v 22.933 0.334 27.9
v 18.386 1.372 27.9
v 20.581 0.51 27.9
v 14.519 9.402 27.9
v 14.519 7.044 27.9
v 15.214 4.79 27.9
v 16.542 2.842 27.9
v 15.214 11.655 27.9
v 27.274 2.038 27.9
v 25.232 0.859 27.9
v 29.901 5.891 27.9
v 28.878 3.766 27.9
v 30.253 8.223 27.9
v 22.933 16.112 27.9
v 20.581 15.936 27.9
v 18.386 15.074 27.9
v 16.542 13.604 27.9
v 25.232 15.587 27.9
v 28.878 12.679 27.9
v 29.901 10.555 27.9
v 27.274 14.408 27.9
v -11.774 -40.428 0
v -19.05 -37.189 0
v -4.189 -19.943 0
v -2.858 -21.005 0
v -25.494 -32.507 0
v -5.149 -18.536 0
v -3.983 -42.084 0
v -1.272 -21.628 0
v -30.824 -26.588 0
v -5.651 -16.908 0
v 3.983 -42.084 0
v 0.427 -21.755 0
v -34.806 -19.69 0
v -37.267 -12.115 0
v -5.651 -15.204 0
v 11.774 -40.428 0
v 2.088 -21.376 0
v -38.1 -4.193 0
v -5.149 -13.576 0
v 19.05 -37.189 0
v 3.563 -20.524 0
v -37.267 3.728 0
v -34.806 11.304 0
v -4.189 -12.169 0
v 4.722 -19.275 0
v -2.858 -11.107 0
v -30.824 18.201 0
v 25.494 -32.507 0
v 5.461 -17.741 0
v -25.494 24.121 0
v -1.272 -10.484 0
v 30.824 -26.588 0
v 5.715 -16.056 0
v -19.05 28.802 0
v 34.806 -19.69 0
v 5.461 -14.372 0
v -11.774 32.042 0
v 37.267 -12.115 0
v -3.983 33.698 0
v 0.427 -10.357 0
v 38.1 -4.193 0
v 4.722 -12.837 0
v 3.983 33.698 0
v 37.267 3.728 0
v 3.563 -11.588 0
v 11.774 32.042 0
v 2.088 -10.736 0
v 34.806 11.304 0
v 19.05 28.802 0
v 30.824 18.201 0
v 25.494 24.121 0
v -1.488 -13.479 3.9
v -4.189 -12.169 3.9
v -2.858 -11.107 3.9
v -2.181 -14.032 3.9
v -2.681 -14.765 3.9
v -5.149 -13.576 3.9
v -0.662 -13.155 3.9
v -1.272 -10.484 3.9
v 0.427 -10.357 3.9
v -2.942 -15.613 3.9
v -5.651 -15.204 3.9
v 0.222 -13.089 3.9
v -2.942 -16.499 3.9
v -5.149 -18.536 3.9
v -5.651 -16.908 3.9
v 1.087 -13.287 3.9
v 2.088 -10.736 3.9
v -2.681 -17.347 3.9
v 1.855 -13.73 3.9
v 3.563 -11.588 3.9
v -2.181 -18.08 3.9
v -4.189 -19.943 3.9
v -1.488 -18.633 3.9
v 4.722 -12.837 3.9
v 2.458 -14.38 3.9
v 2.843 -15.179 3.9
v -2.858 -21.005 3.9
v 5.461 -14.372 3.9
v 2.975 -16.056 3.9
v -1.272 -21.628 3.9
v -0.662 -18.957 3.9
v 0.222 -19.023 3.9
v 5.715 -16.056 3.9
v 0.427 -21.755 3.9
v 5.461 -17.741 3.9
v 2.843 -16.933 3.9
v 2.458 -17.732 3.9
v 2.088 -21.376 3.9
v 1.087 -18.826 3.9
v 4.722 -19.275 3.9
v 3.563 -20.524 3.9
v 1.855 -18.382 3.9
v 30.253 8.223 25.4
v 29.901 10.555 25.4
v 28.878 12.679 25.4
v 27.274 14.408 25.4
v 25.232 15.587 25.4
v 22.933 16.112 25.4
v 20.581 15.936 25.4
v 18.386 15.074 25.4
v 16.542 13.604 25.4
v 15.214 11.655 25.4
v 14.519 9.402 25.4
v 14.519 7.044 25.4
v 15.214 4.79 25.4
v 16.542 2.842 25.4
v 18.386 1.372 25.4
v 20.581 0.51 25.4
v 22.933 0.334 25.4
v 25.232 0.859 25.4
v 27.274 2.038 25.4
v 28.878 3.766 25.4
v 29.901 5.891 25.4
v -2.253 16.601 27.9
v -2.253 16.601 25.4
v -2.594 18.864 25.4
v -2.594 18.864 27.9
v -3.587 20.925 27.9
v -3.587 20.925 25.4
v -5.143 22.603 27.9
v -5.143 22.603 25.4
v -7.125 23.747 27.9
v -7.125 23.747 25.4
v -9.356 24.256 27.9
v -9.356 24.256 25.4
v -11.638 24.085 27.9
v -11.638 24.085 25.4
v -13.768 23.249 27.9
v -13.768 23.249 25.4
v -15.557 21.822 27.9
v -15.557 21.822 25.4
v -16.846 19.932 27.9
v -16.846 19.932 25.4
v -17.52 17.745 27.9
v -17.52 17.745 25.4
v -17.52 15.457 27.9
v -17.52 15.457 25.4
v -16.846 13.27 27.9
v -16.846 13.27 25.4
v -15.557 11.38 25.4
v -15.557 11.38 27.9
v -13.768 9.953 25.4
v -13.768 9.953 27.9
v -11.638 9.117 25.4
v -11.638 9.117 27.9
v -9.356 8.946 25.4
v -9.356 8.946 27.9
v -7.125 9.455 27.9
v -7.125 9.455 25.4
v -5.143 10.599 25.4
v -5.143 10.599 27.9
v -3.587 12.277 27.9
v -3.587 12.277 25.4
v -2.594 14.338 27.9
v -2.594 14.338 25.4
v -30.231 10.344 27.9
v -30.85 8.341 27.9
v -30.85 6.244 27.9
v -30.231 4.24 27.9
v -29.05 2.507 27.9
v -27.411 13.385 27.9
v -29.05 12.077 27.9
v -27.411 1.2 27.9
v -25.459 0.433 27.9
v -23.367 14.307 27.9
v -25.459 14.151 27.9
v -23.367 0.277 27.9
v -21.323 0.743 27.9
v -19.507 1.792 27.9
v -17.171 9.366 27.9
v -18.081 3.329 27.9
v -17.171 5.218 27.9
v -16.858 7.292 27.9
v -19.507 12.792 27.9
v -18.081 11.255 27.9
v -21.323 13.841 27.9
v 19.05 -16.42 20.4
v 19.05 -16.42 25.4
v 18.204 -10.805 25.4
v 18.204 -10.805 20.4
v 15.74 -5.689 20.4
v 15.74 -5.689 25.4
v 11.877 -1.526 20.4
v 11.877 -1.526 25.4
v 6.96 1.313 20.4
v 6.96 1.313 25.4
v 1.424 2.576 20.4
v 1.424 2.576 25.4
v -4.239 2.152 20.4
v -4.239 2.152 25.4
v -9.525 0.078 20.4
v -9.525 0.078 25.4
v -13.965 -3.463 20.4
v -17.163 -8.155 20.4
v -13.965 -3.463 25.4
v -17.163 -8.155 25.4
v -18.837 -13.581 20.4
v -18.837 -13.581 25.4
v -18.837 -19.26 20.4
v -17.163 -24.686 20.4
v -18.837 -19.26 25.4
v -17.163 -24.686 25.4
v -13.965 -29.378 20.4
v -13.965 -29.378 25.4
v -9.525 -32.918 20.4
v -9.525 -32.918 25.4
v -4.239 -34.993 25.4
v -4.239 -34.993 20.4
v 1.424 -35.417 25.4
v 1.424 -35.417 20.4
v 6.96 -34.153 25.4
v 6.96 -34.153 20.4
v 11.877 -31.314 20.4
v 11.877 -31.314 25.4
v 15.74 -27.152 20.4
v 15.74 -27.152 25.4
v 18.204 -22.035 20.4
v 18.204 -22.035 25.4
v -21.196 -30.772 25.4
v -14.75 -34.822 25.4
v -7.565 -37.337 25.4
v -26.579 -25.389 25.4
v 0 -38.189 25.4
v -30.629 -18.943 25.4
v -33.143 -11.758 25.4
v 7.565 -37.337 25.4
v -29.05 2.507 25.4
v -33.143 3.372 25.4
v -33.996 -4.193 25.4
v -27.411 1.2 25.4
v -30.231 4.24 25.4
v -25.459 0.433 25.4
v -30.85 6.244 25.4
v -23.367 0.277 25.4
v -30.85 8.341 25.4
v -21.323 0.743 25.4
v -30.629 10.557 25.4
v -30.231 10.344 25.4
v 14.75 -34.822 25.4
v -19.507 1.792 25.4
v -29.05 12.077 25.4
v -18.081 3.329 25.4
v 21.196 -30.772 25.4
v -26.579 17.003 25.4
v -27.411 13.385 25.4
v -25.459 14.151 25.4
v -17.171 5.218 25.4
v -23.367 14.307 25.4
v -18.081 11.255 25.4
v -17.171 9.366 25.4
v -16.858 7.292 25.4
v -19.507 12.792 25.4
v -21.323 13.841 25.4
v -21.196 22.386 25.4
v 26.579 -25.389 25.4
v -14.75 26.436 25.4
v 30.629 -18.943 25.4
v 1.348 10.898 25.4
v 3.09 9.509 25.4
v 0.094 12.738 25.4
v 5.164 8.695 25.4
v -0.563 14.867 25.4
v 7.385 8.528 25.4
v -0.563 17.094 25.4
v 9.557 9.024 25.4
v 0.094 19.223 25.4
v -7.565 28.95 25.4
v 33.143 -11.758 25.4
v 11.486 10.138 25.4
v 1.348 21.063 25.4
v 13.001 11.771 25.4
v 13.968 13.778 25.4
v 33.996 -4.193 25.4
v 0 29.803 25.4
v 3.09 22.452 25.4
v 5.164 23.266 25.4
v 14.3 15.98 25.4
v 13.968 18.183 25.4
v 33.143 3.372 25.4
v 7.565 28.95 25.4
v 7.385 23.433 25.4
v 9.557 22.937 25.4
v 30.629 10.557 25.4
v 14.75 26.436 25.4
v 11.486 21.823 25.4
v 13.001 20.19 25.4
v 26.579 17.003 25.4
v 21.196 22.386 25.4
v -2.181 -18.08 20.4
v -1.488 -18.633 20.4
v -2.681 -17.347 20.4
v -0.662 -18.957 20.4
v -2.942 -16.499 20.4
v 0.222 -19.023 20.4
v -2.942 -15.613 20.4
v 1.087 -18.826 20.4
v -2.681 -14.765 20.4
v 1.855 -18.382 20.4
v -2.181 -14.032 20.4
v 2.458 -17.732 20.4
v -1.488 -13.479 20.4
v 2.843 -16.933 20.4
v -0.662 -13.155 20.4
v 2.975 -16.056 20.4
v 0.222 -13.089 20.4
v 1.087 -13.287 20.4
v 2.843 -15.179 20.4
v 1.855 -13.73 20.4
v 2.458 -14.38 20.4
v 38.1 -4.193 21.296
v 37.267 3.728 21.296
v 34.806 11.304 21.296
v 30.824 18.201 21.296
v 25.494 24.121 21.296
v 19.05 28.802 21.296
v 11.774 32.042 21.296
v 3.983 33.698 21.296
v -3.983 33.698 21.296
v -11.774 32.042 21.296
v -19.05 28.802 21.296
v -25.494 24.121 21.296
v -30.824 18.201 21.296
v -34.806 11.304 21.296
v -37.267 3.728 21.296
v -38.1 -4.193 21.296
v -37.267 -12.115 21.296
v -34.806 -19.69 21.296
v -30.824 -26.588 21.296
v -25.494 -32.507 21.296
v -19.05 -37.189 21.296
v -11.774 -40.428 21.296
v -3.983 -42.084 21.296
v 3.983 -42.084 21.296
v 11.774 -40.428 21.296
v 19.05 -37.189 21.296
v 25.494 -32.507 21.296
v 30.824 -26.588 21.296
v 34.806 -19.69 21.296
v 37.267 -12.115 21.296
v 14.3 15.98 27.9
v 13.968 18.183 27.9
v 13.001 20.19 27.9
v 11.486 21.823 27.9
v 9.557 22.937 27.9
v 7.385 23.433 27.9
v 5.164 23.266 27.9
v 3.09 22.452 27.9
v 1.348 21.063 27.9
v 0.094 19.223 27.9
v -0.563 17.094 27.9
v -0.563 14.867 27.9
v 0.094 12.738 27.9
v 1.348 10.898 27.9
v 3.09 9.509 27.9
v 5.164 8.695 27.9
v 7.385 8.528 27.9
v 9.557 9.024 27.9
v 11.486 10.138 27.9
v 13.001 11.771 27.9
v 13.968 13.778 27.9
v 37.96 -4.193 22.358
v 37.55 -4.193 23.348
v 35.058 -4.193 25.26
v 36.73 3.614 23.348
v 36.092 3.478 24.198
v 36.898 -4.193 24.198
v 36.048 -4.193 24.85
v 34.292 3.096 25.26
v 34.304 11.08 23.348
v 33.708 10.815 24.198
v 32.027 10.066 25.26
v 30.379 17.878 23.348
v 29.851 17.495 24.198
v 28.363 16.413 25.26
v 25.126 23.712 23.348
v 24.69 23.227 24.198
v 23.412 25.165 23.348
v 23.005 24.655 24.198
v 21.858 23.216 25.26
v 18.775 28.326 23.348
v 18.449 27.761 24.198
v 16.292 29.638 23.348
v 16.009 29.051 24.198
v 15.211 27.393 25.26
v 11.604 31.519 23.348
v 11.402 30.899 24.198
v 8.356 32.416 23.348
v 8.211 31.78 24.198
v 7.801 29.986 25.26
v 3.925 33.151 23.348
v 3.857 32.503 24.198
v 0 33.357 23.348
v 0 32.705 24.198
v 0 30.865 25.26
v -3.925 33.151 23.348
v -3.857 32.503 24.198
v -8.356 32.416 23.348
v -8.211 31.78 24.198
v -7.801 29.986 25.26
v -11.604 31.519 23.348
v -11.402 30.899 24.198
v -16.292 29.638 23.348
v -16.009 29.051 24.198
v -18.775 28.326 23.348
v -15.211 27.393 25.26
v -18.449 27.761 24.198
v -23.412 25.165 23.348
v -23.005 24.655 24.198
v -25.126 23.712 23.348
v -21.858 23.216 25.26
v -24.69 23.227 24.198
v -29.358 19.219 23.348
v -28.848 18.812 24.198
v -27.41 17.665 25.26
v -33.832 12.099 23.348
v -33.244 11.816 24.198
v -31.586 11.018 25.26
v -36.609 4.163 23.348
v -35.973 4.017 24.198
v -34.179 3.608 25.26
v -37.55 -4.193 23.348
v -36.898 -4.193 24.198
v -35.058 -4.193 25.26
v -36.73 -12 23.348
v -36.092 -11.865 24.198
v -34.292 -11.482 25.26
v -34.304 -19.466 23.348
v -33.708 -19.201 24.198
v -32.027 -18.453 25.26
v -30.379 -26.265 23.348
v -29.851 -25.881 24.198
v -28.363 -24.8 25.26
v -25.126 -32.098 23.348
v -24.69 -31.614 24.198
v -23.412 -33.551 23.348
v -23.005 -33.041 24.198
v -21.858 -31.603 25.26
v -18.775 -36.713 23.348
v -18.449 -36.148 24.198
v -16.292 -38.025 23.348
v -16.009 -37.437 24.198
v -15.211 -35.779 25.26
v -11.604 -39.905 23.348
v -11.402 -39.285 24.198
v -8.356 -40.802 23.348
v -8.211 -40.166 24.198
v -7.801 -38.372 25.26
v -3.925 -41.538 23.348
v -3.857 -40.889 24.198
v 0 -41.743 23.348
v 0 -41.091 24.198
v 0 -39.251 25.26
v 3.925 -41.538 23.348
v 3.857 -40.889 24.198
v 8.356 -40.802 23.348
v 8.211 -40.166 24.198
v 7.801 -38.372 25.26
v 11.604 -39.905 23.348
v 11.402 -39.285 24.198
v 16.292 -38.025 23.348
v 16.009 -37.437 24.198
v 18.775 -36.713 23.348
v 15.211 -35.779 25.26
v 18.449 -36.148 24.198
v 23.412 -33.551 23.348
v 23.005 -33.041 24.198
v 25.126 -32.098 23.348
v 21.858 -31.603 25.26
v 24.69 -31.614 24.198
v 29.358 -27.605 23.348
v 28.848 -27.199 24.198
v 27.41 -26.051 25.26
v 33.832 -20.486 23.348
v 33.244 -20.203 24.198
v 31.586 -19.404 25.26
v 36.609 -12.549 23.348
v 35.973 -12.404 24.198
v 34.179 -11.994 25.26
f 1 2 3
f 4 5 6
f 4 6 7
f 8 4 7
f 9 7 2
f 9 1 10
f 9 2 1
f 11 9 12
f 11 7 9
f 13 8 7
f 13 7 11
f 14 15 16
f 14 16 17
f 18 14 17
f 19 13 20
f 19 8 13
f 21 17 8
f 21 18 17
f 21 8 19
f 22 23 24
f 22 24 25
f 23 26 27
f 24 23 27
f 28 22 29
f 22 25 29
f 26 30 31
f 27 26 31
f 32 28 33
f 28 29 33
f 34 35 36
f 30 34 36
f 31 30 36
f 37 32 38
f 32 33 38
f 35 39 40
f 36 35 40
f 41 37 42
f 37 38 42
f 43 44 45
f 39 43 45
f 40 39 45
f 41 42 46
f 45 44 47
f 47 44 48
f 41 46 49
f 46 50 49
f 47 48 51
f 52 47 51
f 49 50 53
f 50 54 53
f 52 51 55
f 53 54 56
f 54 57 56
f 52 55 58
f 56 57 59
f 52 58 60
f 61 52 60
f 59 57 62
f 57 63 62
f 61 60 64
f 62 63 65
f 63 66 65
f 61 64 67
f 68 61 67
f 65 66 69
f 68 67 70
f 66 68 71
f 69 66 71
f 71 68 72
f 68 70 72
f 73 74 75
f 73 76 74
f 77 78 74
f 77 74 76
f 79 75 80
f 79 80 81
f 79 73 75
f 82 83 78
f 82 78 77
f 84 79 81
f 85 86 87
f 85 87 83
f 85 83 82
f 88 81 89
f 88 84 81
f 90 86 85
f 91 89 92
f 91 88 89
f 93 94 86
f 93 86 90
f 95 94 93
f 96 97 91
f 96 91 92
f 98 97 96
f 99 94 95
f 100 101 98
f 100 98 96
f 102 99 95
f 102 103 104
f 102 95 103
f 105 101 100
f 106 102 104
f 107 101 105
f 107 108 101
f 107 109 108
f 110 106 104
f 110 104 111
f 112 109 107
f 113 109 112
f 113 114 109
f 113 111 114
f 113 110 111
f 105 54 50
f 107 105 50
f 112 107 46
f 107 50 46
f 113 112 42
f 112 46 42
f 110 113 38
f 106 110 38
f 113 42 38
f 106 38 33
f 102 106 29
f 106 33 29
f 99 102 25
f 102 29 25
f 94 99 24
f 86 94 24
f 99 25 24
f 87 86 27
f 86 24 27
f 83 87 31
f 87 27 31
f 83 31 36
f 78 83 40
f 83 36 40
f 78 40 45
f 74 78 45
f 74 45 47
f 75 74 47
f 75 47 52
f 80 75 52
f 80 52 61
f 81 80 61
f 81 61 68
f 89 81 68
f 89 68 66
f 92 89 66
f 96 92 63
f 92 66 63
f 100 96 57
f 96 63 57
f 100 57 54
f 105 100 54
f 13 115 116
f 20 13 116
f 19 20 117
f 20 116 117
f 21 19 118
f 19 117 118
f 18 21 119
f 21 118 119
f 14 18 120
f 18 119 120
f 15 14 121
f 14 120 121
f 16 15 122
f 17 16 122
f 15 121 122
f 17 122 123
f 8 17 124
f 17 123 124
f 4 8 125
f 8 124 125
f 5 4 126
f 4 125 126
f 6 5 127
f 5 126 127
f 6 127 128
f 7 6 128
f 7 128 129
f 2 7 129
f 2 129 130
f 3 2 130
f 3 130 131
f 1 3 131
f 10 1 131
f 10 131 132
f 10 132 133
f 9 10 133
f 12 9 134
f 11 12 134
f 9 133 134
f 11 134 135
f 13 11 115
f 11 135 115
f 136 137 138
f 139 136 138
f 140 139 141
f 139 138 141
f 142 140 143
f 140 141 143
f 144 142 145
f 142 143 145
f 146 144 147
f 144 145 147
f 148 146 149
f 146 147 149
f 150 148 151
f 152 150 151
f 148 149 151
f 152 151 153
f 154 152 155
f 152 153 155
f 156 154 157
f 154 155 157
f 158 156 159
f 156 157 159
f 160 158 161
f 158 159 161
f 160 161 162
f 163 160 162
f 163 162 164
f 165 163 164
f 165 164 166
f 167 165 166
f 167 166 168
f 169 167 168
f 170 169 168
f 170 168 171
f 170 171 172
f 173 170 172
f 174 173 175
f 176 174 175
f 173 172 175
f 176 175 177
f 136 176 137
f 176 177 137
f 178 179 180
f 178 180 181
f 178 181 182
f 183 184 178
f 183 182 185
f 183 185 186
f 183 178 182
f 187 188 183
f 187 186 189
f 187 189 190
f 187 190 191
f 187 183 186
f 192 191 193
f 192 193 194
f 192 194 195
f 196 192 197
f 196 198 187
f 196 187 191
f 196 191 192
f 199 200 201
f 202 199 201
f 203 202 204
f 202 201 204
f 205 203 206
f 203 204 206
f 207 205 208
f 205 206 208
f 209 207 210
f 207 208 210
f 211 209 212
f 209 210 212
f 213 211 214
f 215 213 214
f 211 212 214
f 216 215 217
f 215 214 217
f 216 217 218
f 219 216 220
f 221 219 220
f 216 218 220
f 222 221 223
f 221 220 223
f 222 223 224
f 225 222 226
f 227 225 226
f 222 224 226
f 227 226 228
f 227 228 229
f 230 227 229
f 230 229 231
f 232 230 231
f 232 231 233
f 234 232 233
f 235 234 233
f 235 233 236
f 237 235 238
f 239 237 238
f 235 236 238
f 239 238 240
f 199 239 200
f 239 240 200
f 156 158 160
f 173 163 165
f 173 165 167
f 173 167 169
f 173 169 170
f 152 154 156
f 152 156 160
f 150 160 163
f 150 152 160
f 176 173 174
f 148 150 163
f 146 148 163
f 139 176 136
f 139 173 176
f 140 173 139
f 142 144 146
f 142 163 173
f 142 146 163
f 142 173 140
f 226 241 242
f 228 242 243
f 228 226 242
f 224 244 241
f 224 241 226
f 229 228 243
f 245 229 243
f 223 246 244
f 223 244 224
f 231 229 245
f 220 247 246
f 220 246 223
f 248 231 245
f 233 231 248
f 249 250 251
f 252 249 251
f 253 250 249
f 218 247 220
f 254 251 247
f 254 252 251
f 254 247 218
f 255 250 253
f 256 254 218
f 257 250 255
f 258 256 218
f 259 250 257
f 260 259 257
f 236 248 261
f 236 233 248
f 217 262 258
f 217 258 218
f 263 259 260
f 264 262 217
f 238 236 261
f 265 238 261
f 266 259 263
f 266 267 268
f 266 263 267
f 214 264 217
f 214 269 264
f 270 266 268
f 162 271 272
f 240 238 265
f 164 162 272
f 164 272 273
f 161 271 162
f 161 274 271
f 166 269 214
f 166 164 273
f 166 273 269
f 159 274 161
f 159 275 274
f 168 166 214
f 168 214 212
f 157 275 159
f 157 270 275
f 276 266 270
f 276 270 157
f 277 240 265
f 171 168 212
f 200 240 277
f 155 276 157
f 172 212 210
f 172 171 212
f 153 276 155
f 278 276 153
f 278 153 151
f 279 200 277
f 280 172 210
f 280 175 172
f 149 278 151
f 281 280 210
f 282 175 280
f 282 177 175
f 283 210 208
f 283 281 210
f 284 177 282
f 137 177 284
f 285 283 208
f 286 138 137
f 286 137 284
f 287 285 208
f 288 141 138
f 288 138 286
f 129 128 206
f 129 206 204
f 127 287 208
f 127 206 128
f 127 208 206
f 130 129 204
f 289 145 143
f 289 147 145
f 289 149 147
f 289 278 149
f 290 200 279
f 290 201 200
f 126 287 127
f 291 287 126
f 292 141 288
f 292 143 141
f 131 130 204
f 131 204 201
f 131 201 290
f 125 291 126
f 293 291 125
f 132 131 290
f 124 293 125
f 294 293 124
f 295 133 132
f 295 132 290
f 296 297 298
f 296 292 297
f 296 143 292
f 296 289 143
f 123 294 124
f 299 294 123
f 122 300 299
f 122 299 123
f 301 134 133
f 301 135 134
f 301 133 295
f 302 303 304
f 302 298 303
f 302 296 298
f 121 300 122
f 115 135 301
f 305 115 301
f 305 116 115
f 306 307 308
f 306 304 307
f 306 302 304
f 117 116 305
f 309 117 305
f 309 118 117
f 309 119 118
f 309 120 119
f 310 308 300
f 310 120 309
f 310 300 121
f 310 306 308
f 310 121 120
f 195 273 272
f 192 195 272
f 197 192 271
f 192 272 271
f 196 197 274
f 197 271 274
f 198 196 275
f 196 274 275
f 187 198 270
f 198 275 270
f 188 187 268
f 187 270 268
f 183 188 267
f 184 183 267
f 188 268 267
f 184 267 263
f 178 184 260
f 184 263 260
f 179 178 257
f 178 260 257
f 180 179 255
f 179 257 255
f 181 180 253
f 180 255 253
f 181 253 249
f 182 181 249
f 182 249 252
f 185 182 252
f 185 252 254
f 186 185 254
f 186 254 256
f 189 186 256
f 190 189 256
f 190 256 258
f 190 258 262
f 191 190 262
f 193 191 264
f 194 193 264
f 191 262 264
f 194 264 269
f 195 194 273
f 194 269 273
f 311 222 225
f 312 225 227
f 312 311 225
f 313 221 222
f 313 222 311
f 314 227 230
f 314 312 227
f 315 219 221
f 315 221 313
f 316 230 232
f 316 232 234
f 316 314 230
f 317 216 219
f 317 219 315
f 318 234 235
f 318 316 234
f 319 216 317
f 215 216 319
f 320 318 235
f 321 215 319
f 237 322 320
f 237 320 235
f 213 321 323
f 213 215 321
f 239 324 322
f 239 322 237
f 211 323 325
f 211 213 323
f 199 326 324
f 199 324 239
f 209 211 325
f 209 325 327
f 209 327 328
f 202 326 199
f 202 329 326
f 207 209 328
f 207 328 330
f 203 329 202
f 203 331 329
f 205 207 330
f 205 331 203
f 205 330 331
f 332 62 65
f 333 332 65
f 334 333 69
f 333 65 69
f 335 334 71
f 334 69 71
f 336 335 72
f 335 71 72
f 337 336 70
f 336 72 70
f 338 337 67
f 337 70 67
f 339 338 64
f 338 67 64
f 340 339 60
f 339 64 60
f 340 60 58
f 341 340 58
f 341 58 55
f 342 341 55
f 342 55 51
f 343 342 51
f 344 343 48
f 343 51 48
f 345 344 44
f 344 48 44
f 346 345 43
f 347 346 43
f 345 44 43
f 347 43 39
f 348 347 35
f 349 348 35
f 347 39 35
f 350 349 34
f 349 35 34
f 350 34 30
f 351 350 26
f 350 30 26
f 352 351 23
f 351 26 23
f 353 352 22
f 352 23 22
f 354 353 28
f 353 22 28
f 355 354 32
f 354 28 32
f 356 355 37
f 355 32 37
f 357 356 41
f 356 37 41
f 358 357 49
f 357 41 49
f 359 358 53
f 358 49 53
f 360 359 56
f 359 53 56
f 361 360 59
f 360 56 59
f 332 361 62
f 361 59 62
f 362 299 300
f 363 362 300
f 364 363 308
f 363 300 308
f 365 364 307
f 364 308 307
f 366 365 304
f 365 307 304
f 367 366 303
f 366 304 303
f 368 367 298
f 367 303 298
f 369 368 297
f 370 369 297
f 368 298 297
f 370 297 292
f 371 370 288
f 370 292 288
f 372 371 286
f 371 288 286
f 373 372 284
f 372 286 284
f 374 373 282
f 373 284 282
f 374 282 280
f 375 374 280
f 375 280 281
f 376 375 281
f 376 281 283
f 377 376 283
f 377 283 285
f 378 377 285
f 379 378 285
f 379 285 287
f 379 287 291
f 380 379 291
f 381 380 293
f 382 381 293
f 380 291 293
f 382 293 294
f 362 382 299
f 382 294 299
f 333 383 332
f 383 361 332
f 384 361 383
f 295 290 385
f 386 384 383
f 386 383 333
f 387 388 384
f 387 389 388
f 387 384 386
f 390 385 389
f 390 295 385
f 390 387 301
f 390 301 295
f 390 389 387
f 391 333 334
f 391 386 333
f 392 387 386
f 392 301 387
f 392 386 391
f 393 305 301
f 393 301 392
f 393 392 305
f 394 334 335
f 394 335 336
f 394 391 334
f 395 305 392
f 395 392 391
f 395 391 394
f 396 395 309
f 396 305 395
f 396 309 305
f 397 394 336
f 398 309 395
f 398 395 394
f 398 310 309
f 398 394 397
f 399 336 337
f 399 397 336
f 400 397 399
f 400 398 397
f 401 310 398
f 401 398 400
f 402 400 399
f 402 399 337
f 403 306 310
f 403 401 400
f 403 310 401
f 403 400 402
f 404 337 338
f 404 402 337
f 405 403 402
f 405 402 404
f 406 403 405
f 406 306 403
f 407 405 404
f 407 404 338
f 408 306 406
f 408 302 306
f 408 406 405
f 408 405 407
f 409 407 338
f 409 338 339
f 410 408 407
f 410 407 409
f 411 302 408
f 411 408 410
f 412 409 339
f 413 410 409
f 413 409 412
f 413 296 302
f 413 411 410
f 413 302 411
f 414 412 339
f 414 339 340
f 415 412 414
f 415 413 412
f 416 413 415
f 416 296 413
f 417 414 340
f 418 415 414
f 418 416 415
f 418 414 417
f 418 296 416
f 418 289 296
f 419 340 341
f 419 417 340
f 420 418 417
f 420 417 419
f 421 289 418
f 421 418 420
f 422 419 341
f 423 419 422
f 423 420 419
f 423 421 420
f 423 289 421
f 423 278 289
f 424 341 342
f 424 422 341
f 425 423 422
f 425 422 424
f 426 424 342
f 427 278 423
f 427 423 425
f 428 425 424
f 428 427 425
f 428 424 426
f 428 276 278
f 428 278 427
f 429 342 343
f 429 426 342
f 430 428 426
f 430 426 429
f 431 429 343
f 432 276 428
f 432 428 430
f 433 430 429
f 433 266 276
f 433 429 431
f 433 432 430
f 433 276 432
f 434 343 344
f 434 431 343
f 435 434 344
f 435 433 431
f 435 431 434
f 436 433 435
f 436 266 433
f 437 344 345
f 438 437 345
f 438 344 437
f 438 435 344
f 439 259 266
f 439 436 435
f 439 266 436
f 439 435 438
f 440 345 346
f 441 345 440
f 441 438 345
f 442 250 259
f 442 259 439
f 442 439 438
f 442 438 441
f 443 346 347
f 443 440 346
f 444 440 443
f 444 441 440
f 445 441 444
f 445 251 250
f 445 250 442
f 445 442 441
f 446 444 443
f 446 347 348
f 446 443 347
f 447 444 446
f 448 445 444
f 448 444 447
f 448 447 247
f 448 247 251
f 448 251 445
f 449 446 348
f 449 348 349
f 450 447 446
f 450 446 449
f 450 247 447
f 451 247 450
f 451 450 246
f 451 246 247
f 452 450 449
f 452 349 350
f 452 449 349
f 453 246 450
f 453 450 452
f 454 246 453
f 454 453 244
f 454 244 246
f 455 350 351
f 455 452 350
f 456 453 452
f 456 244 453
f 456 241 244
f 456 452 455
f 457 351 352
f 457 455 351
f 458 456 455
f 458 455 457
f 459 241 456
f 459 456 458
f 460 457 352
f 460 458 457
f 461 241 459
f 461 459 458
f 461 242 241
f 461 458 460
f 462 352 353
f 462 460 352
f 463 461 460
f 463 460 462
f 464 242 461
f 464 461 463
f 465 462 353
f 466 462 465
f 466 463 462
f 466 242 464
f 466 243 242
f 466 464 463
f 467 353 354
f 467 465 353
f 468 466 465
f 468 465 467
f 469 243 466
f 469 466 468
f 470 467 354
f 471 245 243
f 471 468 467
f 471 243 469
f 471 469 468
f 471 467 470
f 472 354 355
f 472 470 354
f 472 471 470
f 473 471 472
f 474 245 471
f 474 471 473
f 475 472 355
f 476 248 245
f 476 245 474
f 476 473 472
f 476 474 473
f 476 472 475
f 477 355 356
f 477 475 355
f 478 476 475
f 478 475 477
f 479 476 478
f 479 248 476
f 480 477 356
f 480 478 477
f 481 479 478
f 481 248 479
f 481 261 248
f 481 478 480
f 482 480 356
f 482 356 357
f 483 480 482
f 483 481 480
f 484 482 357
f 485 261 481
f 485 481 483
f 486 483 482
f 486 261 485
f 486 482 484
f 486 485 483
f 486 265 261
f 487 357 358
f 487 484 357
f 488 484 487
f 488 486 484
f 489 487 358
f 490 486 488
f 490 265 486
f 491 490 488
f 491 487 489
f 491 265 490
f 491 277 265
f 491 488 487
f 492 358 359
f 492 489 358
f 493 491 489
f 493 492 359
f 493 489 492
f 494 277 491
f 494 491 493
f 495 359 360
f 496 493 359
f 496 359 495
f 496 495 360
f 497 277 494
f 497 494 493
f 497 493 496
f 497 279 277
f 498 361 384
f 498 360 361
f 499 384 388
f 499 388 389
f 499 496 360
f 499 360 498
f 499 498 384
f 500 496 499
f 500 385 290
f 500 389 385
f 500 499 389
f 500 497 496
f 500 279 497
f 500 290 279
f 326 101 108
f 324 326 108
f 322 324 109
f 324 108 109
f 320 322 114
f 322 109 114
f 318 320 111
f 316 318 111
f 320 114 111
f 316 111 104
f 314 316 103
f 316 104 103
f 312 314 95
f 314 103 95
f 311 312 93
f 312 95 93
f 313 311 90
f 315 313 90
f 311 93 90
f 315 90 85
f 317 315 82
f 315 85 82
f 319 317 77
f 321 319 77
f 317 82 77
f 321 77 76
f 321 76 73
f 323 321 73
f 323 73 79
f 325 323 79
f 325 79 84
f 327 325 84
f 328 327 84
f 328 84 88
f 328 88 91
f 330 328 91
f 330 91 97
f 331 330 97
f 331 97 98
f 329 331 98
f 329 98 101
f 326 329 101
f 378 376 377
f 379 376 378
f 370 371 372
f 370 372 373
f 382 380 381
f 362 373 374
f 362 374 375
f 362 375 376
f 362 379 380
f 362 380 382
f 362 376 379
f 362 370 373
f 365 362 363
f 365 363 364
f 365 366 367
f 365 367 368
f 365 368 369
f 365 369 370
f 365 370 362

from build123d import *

# Parameters (mm, degrees)
F0_R      = 38.1
F2_DEPTH  = 25.4
F3_R      = 4.104163056
F4_R      = 7.676399804
F4_R_2    = 7.4730209118
F4_R_3    = 7.9111301116
F4_R_4    = 7.0349890874
F6_DEPTH  = 2.5
F7_R      = 19.05
F8_DEPTH  = 5
F9_R      = 5.715
F10_DEPTH = 3.9
F11_R     = 2.9751470693
F12_DEPTH = 24.001


# Not quite as in the source:
# - a feature names something its author has since deleted; it is built from what else it names


with BuildPart() as f2:
    # F0 (on Top) → F2 (new body)
    with BuildSketch(Plane.XY):
        with Locations((0, -4.1931332196)):
            Circle(F0_R)
    extrude(amount=F2_DEPTH)

    # F3
    f3_edges = [f2.edges().sort_by_distance(p)[0] for p in [
        (-38.1, -4.193133, 25.4),
    ]]
    fillet(f3_edges, radius=F3_R)

    # F4 (on face) → F6 (join)
    with BuildSketch(Plane.XY.offset(25.4)):
        with Locations((-9.9296038883, 16.6010573738)):
            Circle(F4_R)
        with Locations((6.8266042386, 15.9804562879)):
            Circle(F4_R_2)
        with Locations((22.3416063405, 8.2229533103)):
            Circle(F4_R_3)
        with Locations((-23.8931100186, 7.2920526448)):
            Circle(F4_R_4)
    extrude(amount=F6_DEPTH)

    # F7 (on face) → F8 (cut)
    with BuildSketch(Plane.XY.offset(25.4)):
        with Locations((0, -16.4202762372)):
            Circle(F7_R)
    extrude(amount=-F8_DEPTH, mode=Mode.SUBTRACT)

    # F9 (on face) → F10 (cut)
    with BuildSketch(Plane(origin=(0, 0, 0), x_dir=(1, 0, 0), z_dir=(0, 0, -1))):
        with Locations((0, 16.0560380752)):
            Circle(F9_R)
    extrude(amount=-F10_DEPTH, mode=Mode.SUBTRACT)

    # F11 (on face) → F12 (cut, through all)
    with BuildSketch(Plane(origin=(0, 0, 3.9), x_dir=(1, 0, 0), z_dir=(0, 0, -1))):
        with Locations((0, 16.0560380752)):
            Circle(F11_R)
    extrude(amount=-F12_DEPTH, mode=Mode.SUBTRACT)


solid = f2.part
